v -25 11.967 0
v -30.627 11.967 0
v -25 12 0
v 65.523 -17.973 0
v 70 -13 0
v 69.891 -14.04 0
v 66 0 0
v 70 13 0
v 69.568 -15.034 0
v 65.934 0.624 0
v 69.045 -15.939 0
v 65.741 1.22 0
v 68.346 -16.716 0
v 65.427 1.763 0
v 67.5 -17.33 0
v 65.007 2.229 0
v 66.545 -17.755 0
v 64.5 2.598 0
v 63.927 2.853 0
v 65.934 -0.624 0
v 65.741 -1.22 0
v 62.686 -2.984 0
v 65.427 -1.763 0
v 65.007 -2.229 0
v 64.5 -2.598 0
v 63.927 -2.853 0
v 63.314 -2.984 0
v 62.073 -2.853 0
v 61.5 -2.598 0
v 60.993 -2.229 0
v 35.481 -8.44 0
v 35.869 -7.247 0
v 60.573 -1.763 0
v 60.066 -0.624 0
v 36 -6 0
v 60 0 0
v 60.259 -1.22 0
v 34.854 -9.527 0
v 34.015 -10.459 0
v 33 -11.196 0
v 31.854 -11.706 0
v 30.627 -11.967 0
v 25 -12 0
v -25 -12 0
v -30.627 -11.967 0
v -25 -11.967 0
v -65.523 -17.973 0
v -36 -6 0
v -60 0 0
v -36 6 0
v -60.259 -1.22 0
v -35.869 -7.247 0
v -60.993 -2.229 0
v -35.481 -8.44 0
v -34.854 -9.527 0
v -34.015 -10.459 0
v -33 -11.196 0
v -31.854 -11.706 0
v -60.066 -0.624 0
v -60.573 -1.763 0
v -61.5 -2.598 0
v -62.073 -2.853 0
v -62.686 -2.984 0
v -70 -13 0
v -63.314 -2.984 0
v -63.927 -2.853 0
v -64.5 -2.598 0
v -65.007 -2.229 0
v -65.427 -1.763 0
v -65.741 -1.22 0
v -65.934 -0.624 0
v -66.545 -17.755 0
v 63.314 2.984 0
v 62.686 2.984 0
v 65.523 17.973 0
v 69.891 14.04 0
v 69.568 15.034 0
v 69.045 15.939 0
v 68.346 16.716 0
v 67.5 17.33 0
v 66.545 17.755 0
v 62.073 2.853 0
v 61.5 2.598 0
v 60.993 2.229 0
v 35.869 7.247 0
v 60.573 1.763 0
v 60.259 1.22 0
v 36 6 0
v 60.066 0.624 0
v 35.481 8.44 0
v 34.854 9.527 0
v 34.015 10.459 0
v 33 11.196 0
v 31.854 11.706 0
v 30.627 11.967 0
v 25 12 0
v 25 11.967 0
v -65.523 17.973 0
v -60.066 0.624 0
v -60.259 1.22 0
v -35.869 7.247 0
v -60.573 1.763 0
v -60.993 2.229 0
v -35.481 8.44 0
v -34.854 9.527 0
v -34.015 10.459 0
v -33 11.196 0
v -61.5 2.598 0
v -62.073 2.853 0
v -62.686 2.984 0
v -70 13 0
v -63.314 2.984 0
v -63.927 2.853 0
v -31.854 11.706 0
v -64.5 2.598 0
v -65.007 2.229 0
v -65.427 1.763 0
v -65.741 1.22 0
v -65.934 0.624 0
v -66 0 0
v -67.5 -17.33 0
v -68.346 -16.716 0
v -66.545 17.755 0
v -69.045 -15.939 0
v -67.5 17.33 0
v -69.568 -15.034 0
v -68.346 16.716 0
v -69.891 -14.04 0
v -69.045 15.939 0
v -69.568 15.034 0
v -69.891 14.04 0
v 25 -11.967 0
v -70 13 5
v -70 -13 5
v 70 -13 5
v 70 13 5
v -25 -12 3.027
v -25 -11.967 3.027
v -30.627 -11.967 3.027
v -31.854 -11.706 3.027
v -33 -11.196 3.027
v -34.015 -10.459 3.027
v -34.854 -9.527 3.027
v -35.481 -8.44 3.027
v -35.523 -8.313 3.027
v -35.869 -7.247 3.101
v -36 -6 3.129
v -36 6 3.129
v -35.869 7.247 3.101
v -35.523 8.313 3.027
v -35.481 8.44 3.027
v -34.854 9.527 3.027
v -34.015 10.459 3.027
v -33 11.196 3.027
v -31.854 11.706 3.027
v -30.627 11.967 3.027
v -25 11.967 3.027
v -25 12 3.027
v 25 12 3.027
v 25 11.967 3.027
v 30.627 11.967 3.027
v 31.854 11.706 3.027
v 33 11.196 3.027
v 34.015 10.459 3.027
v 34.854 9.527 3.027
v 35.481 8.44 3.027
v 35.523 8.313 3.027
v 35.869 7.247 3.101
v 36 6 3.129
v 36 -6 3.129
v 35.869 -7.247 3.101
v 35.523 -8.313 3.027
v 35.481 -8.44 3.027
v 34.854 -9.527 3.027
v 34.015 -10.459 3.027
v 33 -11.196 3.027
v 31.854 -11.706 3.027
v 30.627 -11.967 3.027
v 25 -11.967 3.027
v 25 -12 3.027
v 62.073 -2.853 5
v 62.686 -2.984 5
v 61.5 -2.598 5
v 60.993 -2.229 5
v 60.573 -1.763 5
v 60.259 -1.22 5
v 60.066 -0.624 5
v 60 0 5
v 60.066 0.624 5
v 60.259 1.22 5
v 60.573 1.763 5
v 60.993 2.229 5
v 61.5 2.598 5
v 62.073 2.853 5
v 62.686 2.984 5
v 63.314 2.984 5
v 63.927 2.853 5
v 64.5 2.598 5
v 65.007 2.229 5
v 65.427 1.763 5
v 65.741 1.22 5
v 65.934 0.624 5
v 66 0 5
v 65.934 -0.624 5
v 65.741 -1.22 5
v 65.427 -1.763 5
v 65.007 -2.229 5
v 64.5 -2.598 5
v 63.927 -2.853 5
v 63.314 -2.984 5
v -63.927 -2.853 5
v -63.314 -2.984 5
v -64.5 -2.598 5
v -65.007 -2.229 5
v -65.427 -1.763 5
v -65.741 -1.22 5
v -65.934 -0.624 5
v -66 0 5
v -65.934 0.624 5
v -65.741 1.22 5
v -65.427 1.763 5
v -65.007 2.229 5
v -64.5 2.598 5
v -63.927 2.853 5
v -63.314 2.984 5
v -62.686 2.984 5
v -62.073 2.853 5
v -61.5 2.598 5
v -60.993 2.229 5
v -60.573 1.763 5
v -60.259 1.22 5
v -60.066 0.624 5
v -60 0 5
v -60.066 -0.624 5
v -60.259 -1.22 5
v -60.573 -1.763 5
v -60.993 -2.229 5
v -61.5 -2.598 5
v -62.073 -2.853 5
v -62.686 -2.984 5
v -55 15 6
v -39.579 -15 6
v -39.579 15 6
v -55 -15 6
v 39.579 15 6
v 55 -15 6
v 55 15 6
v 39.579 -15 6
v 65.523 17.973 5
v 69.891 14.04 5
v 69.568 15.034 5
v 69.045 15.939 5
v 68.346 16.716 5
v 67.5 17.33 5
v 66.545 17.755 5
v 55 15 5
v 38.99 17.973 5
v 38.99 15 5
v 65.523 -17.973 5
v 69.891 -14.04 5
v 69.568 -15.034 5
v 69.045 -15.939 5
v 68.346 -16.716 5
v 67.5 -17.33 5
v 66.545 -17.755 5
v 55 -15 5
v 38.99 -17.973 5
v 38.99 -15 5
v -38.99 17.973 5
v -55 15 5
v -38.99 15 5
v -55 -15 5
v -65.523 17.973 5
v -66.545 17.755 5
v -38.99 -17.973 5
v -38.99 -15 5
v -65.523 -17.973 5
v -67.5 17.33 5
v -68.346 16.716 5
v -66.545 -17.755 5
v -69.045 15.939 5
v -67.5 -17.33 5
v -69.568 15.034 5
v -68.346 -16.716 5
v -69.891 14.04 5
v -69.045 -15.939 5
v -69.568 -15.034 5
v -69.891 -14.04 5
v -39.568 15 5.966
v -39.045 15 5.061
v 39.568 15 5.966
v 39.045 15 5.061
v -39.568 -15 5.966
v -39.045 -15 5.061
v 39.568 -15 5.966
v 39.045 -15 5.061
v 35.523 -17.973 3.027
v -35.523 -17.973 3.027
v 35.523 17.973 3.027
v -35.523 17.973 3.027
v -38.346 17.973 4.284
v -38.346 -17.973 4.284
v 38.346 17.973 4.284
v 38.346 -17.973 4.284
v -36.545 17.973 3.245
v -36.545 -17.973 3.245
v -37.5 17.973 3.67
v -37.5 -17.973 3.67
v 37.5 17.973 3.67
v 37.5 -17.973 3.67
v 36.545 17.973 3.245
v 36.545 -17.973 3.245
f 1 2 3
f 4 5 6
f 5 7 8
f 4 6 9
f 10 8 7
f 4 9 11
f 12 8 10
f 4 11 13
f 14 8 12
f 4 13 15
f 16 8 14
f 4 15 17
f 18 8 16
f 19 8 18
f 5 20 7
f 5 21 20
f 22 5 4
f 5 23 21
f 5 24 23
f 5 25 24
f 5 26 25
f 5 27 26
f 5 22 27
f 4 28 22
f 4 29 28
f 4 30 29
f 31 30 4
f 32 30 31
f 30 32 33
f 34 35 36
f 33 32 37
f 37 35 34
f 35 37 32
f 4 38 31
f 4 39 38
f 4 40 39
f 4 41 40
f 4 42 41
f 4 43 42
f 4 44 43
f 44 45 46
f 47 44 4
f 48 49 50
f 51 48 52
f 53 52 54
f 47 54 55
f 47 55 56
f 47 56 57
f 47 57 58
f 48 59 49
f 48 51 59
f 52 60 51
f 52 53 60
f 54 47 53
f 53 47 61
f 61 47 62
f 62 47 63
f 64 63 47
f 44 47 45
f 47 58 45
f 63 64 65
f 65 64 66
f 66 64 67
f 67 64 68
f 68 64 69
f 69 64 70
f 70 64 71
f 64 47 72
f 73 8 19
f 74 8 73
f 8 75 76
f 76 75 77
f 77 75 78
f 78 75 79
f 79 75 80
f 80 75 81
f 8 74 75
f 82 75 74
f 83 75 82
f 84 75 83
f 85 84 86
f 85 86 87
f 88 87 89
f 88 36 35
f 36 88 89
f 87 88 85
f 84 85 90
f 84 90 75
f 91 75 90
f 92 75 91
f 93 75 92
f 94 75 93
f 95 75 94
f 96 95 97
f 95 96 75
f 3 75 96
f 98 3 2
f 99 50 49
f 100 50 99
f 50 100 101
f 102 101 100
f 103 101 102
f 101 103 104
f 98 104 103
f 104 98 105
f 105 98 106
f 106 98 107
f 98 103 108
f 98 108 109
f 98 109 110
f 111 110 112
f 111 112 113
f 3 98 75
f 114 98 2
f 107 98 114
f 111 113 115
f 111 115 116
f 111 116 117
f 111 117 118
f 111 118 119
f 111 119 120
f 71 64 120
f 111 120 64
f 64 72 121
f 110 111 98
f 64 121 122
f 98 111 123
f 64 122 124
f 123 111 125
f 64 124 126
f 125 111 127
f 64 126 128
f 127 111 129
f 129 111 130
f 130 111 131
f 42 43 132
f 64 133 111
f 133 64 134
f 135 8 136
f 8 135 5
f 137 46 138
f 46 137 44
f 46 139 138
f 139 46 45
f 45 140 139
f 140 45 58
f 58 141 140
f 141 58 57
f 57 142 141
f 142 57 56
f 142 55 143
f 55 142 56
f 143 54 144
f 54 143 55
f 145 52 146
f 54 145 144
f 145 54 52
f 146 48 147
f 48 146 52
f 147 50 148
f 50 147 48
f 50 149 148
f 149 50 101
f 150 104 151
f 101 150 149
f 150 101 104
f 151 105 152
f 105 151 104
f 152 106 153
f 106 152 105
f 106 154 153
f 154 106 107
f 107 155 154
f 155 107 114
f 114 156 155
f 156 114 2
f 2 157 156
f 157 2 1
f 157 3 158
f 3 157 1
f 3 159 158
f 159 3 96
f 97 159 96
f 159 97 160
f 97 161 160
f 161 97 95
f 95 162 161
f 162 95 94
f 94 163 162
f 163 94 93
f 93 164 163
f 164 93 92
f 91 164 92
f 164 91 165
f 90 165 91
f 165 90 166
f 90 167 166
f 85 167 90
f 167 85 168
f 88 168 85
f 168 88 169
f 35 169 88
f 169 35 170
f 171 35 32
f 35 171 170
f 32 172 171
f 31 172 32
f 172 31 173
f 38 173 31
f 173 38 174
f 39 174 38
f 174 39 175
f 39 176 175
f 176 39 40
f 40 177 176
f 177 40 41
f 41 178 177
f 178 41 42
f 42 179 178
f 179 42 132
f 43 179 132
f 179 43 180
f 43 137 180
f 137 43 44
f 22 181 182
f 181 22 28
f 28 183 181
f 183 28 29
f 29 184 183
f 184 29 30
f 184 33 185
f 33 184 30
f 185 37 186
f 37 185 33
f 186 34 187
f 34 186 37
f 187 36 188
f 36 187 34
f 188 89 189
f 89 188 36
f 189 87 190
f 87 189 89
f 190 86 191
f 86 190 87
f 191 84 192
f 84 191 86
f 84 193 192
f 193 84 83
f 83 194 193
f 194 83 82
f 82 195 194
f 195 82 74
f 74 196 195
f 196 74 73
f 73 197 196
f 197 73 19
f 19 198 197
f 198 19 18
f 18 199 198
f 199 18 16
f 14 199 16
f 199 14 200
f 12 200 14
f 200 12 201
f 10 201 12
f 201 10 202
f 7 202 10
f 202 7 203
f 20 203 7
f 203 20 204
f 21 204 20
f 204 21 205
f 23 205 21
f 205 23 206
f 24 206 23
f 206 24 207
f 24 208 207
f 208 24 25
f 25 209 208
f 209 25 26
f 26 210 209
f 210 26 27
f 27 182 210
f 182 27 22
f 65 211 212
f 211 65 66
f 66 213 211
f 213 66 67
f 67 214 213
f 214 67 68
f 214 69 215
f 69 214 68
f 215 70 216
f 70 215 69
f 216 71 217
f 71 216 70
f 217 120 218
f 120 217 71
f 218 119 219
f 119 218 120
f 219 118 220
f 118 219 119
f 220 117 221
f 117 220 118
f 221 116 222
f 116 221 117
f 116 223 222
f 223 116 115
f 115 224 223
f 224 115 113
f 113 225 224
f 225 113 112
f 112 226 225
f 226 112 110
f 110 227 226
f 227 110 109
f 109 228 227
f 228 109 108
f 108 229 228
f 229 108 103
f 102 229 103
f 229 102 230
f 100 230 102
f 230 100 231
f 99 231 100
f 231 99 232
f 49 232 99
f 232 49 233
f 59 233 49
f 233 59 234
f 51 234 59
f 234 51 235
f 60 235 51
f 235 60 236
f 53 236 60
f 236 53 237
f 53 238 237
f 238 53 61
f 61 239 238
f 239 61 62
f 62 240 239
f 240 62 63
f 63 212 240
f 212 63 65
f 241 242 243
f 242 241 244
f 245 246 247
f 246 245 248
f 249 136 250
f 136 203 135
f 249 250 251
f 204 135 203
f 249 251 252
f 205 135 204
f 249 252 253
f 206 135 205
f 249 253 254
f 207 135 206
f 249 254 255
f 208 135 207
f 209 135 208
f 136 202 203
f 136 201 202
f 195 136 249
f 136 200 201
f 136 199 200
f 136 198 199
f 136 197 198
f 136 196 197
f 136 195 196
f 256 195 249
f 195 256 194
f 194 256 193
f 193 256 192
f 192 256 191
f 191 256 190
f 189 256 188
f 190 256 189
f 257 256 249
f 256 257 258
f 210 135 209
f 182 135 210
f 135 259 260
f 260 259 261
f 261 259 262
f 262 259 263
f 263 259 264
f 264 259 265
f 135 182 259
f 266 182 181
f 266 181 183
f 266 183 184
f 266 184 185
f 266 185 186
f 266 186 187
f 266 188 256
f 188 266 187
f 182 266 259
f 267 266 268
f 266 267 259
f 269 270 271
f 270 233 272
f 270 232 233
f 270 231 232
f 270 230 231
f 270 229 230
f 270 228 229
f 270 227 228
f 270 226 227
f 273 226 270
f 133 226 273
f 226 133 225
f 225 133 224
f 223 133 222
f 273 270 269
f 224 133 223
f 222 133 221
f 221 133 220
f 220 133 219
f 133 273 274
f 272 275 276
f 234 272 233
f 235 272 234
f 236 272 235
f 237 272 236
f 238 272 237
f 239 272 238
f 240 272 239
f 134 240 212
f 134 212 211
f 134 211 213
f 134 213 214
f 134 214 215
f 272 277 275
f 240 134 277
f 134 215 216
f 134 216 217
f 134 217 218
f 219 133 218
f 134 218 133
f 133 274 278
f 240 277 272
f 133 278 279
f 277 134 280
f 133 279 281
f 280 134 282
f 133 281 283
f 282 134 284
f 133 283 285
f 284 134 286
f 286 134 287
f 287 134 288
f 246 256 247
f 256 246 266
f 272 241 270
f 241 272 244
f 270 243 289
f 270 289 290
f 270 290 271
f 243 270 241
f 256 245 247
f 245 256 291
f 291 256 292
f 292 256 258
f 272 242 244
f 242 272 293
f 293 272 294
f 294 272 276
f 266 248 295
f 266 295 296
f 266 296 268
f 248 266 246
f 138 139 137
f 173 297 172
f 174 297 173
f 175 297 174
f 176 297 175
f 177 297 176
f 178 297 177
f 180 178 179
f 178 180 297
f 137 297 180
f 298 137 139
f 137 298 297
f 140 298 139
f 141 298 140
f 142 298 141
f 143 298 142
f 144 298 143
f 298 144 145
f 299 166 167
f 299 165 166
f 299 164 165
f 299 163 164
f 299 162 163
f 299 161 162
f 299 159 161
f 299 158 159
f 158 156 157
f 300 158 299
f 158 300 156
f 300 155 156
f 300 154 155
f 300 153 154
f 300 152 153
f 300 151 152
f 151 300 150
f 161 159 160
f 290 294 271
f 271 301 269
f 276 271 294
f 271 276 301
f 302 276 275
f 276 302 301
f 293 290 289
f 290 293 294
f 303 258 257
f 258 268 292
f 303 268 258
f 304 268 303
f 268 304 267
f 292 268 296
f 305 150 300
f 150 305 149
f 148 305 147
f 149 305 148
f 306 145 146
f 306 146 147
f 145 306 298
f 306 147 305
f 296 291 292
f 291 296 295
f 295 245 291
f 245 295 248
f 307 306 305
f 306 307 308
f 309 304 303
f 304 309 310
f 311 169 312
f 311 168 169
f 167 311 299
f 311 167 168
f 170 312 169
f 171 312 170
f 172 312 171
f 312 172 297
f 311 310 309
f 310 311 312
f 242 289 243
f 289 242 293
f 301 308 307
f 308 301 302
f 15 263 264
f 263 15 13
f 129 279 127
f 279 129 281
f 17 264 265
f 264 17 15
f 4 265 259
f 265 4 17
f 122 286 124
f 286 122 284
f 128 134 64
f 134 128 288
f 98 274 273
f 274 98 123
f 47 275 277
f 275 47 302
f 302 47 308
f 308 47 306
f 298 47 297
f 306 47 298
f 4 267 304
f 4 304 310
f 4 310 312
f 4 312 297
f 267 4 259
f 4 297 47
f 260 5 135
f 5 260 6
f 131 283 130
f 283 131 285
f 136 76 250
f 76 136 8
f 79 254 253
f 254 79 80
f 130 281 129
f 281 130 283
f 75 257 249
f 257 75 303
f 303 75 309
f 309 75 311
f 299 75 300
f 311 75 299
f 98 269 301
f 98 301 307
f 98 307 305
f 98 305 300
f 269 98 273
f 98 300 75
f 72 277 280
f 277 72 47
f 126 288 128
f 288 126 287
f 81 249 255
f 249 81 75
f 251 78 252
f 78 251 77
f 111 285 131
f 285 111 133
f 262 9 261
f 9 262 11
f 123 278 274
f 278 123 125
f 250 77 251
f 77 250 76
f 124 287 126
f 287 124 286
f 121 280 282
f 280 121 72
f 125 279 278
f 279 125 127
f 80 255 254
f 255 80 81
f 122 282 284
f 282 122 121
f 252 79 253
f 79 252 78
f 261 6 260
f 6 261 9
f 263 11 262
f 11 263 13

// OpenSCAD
  $fs = .01;

intersection(){

linear_extrude(height = 8){
intersection(){

translate([-65,-13,0])
    rounded_square (140, 5);
translate([-65,-117,0])
    rounded_square (140, 5);
}
}







difference(){
    
    
    
    
    
    
    
    
linear_extrude(height = 8){
difference(){

square([140,38],true);

translate([63,0,0])
circle(3);
translate([-63,0,0])
circle(3);
square([50,24],true);
        translate([-30,-6,0])
    rounded_square (24, 6);
    translate([18,-6,0])
    rounded_square (24, 6);


    
}
}


translate([-80,0,-12])
rotate([0,90,0]) 

linear_extrude(height = 200){
difference(){


    square([50,50],true);
translate([-13,-15,0])
    rounded_square (40, 5);
    
    
    

}
}
translate([0,00,5])
linear_extrude(height = 8){
translate([80,00,0])
square([50,50],true);
translate([-80,00,0])
square([50,50],true);
}

translate([0,00,5])
linear_extrude(height = 8){


translate([-40,-40,0])
square([50,50],true);
translate([-40,40,0])
square([50,50],true);
 translate([40,-40,0])
square([50,50],true);
translate([40,40,0])
square([50,50],true);   
    
}


translate([-35,30,8])
rotate([90,0,0]) 
linear_extrude(height = 60){
rounded_square (80, 5);
}

}
}




module rounded_square( width, radius_corner ) {
	//translate( [ radius_corner, radius_corner, 0 ] )
		minkowski() {
			square( width - 2 * radius_corner );
			circle( radius_corner );
		}
}
